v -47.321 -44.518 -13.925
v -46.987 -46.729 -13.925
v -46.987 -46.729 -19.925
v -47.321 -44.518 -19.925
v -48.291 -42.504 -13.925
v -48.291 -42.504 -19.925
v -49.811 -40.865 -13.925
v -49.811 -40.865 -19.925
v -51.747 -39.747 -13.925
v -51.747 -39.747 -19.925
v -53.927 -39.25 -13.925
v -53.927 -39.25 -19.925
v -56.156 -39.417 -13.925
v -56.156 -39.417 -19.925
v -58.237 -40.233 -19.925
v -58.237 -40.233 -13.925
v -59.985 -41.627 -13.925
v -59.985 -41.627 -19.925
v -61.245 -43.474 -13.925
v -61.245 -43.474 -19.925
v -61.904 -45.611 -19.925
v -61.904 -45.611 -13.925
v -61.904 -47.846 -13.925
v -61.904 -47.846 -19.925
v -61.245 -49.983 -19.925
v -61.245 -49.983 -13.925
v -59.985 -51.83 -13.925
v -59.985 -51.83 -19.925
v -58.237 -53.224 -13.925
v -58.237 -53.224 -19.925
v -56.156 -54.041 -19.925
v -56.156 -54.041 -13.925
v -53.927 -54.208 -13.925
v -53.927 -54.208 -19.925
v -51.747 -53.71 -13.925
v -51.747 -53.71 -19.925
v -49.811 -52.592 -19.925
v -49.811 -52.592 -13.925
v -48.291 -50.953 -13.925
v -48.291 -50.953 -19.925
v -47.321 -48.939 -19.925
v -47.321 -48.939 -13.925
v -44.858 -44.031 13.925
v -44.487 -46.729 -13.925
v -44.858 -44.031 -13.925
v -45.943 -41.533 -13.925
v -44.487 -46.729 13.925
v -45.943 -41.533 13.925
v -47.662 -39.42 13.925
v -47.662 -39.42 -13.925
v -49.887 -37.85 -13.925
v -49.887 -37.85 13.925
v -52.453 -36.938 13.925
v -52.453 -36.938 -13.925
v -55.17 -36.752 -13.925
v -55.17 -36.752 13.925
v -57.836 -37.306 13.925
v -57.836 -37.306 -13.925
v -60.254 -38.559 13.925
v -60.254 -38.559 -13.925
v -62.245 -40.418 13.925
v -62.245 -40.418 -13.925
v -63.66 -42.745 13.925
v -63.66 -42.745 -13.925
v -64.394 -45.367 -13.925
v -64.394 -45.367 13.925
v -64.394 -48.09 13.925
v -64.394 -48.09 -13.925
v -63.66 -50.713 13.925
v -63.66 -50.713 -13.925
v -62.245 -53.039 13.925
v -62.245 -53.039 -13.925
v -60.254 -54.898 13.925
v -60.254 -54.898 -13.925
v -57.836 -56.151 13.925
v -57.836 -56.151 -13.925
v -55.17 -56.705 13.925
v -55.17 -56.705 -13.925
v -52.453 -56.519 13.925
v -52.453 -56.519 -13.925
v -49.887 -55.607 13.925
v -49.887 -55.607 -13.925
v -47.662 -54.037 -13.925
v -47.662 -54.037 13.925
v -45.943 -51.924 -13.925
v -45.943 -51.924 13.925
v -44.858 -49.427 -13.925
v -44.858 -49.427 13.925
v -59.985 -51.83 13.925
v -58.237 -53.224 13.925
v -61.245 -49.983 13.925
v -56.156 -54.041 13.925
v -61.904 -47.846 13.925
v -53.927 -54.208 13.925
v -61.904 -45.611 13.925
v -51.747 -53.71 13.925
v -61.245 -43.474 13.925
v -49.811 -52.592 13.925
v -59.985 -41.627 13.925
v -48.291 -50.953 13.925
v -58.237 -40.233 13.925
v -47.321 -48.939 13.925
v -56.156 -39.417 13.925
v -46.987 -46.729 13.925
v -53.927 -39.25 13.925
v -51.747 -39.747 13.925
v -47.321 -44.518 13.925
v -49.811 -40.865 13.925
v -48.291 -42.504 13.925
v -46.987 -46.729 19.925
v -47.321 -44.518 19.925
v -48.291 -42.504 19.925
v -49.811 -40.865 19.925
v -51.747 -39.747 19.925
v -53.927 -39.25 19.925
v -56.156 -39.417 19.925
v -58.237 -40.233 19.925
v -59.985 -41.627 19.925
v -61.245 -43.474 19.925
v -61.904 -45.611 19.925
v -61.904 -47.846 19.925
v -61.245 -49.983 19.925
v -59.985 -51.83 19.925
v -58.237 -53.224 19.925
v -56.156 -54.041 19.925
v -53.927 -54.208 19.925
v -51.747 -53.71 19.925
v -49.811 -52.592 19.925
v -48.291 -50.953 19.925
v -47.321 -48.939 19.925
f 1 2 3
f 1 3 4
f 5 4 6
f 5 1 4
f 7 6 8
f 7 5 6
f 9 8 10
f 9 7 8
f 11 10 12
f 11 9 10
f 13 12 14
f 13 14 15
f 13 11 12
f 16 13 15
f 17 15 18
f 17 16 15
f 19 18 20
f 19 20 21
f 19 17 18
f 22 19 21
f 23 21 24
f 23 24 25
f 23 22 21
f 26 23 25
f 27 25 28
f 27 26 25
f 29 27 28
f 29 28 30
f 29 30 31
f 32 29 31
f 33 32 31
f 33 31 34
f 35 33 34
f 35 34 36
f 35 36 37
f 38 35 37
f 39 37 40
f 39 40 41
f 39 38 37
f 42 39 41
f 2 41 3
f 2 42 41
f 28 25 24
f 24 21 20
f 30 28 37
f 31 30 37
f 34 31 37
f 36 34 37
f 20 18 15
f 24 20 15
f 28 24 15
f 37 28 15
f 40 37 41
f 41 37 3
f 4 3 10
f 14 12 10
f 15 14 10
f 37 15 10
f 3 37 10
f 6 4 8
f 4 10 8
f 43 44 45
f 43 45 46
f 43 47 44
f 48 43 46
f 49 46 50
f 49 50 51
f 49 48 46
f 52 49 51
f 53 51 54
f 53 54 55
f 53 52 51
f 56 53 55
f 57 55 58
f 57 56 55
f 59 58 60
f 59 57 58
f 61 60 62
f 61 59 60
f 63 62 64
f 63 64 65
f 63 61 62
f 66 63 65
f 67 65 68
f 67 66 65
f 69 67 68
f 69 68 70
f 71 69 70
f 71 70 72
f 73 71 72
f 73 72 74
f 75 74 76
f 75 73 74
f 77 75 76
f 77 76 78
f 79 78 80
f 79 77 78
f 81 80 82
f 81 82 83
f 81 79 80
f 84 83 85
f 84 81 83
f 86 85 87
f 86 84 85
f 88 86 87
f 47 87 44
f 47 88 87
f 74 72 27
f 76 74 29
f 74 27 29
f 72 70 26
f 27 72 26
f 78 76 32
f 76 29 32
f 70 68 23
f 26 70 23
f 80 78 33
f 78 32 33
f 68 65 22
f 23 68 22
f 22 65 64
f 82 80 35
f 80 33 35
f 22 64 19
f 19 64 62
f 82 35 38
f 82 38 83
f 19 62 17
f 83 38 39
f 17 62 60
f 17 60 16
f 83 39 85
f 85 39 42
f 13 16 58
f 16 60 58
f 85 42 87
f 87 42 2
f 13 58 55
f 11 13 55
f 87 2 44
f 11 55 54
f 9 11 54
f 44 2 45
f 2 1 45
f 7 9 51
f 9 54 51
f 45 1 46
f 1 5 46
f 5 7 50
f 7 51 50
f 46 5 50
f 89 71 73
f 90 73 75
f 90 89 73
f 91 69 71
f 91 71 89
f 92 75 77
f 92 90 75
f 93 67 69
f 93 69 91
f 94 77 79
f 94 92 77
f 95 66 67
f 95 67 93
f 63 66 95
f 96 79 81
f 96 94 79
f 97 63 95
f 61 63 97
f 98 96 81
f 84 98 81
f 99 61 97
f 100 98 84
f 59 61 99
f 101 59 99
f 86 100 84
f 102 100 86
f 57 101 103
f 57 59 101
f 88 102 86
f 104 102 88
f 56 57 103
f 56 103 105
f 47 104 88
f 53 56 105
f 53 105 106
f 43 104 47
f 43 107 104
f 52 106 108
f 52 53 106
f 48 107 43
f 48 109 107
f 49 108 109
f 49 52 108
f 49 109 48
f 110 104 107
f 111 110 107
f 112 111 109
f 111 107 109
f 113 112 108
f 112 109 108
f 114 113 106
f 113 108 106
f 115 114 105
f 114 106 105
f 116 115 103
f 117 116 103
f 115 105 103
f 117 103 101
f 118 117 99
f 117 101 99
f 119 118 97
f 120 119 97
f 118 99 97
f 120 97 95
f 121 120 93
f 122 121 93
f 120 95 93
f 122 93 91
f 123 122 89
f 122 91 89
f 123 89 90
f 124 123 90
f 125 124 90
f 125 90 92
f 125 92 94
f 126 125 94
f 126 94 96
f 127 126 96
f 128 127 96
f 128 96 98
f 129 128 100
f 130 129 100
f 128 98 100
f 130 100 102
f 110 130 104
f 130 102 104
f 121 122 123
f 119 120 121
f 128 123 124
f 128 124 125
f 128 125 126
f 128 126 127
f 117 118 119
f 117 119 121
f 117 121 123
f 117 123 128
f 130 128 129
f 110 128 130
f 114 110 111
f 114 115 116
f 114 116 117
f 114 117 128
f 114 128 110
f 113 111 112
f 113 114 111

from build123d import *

# Parameters (mm, degrees)
F0_R     = 10
F1_DEPTH = 13.925
F2_R     = 7.5
F3_DEPTH = 6


with BuildPart() as f1:
    # F0 (on Top) → F1 (new body, symmetric)
    with BuildSketch(Plane.XY):
        with Locations((-54.4874072075, -46.7285439372)):
            Circle(F0_R)
    extrude(amount=F1_DEPTH, both=True)

    # F2 (on face) → F3 (join)
    with BuildSketch(Plane.XY.offset(13.925)):
        with Locations((-54.4874072075, -46.7285439372)):
            Circle(F2_R)
    extrude(amount=F3_DEPTH)

    # F4: F1 across plane


with BuildPart() as f1_1:
    add(f1.part)
    add(f1.part.mirror(Plane.XY))


solid = f1_1.part
